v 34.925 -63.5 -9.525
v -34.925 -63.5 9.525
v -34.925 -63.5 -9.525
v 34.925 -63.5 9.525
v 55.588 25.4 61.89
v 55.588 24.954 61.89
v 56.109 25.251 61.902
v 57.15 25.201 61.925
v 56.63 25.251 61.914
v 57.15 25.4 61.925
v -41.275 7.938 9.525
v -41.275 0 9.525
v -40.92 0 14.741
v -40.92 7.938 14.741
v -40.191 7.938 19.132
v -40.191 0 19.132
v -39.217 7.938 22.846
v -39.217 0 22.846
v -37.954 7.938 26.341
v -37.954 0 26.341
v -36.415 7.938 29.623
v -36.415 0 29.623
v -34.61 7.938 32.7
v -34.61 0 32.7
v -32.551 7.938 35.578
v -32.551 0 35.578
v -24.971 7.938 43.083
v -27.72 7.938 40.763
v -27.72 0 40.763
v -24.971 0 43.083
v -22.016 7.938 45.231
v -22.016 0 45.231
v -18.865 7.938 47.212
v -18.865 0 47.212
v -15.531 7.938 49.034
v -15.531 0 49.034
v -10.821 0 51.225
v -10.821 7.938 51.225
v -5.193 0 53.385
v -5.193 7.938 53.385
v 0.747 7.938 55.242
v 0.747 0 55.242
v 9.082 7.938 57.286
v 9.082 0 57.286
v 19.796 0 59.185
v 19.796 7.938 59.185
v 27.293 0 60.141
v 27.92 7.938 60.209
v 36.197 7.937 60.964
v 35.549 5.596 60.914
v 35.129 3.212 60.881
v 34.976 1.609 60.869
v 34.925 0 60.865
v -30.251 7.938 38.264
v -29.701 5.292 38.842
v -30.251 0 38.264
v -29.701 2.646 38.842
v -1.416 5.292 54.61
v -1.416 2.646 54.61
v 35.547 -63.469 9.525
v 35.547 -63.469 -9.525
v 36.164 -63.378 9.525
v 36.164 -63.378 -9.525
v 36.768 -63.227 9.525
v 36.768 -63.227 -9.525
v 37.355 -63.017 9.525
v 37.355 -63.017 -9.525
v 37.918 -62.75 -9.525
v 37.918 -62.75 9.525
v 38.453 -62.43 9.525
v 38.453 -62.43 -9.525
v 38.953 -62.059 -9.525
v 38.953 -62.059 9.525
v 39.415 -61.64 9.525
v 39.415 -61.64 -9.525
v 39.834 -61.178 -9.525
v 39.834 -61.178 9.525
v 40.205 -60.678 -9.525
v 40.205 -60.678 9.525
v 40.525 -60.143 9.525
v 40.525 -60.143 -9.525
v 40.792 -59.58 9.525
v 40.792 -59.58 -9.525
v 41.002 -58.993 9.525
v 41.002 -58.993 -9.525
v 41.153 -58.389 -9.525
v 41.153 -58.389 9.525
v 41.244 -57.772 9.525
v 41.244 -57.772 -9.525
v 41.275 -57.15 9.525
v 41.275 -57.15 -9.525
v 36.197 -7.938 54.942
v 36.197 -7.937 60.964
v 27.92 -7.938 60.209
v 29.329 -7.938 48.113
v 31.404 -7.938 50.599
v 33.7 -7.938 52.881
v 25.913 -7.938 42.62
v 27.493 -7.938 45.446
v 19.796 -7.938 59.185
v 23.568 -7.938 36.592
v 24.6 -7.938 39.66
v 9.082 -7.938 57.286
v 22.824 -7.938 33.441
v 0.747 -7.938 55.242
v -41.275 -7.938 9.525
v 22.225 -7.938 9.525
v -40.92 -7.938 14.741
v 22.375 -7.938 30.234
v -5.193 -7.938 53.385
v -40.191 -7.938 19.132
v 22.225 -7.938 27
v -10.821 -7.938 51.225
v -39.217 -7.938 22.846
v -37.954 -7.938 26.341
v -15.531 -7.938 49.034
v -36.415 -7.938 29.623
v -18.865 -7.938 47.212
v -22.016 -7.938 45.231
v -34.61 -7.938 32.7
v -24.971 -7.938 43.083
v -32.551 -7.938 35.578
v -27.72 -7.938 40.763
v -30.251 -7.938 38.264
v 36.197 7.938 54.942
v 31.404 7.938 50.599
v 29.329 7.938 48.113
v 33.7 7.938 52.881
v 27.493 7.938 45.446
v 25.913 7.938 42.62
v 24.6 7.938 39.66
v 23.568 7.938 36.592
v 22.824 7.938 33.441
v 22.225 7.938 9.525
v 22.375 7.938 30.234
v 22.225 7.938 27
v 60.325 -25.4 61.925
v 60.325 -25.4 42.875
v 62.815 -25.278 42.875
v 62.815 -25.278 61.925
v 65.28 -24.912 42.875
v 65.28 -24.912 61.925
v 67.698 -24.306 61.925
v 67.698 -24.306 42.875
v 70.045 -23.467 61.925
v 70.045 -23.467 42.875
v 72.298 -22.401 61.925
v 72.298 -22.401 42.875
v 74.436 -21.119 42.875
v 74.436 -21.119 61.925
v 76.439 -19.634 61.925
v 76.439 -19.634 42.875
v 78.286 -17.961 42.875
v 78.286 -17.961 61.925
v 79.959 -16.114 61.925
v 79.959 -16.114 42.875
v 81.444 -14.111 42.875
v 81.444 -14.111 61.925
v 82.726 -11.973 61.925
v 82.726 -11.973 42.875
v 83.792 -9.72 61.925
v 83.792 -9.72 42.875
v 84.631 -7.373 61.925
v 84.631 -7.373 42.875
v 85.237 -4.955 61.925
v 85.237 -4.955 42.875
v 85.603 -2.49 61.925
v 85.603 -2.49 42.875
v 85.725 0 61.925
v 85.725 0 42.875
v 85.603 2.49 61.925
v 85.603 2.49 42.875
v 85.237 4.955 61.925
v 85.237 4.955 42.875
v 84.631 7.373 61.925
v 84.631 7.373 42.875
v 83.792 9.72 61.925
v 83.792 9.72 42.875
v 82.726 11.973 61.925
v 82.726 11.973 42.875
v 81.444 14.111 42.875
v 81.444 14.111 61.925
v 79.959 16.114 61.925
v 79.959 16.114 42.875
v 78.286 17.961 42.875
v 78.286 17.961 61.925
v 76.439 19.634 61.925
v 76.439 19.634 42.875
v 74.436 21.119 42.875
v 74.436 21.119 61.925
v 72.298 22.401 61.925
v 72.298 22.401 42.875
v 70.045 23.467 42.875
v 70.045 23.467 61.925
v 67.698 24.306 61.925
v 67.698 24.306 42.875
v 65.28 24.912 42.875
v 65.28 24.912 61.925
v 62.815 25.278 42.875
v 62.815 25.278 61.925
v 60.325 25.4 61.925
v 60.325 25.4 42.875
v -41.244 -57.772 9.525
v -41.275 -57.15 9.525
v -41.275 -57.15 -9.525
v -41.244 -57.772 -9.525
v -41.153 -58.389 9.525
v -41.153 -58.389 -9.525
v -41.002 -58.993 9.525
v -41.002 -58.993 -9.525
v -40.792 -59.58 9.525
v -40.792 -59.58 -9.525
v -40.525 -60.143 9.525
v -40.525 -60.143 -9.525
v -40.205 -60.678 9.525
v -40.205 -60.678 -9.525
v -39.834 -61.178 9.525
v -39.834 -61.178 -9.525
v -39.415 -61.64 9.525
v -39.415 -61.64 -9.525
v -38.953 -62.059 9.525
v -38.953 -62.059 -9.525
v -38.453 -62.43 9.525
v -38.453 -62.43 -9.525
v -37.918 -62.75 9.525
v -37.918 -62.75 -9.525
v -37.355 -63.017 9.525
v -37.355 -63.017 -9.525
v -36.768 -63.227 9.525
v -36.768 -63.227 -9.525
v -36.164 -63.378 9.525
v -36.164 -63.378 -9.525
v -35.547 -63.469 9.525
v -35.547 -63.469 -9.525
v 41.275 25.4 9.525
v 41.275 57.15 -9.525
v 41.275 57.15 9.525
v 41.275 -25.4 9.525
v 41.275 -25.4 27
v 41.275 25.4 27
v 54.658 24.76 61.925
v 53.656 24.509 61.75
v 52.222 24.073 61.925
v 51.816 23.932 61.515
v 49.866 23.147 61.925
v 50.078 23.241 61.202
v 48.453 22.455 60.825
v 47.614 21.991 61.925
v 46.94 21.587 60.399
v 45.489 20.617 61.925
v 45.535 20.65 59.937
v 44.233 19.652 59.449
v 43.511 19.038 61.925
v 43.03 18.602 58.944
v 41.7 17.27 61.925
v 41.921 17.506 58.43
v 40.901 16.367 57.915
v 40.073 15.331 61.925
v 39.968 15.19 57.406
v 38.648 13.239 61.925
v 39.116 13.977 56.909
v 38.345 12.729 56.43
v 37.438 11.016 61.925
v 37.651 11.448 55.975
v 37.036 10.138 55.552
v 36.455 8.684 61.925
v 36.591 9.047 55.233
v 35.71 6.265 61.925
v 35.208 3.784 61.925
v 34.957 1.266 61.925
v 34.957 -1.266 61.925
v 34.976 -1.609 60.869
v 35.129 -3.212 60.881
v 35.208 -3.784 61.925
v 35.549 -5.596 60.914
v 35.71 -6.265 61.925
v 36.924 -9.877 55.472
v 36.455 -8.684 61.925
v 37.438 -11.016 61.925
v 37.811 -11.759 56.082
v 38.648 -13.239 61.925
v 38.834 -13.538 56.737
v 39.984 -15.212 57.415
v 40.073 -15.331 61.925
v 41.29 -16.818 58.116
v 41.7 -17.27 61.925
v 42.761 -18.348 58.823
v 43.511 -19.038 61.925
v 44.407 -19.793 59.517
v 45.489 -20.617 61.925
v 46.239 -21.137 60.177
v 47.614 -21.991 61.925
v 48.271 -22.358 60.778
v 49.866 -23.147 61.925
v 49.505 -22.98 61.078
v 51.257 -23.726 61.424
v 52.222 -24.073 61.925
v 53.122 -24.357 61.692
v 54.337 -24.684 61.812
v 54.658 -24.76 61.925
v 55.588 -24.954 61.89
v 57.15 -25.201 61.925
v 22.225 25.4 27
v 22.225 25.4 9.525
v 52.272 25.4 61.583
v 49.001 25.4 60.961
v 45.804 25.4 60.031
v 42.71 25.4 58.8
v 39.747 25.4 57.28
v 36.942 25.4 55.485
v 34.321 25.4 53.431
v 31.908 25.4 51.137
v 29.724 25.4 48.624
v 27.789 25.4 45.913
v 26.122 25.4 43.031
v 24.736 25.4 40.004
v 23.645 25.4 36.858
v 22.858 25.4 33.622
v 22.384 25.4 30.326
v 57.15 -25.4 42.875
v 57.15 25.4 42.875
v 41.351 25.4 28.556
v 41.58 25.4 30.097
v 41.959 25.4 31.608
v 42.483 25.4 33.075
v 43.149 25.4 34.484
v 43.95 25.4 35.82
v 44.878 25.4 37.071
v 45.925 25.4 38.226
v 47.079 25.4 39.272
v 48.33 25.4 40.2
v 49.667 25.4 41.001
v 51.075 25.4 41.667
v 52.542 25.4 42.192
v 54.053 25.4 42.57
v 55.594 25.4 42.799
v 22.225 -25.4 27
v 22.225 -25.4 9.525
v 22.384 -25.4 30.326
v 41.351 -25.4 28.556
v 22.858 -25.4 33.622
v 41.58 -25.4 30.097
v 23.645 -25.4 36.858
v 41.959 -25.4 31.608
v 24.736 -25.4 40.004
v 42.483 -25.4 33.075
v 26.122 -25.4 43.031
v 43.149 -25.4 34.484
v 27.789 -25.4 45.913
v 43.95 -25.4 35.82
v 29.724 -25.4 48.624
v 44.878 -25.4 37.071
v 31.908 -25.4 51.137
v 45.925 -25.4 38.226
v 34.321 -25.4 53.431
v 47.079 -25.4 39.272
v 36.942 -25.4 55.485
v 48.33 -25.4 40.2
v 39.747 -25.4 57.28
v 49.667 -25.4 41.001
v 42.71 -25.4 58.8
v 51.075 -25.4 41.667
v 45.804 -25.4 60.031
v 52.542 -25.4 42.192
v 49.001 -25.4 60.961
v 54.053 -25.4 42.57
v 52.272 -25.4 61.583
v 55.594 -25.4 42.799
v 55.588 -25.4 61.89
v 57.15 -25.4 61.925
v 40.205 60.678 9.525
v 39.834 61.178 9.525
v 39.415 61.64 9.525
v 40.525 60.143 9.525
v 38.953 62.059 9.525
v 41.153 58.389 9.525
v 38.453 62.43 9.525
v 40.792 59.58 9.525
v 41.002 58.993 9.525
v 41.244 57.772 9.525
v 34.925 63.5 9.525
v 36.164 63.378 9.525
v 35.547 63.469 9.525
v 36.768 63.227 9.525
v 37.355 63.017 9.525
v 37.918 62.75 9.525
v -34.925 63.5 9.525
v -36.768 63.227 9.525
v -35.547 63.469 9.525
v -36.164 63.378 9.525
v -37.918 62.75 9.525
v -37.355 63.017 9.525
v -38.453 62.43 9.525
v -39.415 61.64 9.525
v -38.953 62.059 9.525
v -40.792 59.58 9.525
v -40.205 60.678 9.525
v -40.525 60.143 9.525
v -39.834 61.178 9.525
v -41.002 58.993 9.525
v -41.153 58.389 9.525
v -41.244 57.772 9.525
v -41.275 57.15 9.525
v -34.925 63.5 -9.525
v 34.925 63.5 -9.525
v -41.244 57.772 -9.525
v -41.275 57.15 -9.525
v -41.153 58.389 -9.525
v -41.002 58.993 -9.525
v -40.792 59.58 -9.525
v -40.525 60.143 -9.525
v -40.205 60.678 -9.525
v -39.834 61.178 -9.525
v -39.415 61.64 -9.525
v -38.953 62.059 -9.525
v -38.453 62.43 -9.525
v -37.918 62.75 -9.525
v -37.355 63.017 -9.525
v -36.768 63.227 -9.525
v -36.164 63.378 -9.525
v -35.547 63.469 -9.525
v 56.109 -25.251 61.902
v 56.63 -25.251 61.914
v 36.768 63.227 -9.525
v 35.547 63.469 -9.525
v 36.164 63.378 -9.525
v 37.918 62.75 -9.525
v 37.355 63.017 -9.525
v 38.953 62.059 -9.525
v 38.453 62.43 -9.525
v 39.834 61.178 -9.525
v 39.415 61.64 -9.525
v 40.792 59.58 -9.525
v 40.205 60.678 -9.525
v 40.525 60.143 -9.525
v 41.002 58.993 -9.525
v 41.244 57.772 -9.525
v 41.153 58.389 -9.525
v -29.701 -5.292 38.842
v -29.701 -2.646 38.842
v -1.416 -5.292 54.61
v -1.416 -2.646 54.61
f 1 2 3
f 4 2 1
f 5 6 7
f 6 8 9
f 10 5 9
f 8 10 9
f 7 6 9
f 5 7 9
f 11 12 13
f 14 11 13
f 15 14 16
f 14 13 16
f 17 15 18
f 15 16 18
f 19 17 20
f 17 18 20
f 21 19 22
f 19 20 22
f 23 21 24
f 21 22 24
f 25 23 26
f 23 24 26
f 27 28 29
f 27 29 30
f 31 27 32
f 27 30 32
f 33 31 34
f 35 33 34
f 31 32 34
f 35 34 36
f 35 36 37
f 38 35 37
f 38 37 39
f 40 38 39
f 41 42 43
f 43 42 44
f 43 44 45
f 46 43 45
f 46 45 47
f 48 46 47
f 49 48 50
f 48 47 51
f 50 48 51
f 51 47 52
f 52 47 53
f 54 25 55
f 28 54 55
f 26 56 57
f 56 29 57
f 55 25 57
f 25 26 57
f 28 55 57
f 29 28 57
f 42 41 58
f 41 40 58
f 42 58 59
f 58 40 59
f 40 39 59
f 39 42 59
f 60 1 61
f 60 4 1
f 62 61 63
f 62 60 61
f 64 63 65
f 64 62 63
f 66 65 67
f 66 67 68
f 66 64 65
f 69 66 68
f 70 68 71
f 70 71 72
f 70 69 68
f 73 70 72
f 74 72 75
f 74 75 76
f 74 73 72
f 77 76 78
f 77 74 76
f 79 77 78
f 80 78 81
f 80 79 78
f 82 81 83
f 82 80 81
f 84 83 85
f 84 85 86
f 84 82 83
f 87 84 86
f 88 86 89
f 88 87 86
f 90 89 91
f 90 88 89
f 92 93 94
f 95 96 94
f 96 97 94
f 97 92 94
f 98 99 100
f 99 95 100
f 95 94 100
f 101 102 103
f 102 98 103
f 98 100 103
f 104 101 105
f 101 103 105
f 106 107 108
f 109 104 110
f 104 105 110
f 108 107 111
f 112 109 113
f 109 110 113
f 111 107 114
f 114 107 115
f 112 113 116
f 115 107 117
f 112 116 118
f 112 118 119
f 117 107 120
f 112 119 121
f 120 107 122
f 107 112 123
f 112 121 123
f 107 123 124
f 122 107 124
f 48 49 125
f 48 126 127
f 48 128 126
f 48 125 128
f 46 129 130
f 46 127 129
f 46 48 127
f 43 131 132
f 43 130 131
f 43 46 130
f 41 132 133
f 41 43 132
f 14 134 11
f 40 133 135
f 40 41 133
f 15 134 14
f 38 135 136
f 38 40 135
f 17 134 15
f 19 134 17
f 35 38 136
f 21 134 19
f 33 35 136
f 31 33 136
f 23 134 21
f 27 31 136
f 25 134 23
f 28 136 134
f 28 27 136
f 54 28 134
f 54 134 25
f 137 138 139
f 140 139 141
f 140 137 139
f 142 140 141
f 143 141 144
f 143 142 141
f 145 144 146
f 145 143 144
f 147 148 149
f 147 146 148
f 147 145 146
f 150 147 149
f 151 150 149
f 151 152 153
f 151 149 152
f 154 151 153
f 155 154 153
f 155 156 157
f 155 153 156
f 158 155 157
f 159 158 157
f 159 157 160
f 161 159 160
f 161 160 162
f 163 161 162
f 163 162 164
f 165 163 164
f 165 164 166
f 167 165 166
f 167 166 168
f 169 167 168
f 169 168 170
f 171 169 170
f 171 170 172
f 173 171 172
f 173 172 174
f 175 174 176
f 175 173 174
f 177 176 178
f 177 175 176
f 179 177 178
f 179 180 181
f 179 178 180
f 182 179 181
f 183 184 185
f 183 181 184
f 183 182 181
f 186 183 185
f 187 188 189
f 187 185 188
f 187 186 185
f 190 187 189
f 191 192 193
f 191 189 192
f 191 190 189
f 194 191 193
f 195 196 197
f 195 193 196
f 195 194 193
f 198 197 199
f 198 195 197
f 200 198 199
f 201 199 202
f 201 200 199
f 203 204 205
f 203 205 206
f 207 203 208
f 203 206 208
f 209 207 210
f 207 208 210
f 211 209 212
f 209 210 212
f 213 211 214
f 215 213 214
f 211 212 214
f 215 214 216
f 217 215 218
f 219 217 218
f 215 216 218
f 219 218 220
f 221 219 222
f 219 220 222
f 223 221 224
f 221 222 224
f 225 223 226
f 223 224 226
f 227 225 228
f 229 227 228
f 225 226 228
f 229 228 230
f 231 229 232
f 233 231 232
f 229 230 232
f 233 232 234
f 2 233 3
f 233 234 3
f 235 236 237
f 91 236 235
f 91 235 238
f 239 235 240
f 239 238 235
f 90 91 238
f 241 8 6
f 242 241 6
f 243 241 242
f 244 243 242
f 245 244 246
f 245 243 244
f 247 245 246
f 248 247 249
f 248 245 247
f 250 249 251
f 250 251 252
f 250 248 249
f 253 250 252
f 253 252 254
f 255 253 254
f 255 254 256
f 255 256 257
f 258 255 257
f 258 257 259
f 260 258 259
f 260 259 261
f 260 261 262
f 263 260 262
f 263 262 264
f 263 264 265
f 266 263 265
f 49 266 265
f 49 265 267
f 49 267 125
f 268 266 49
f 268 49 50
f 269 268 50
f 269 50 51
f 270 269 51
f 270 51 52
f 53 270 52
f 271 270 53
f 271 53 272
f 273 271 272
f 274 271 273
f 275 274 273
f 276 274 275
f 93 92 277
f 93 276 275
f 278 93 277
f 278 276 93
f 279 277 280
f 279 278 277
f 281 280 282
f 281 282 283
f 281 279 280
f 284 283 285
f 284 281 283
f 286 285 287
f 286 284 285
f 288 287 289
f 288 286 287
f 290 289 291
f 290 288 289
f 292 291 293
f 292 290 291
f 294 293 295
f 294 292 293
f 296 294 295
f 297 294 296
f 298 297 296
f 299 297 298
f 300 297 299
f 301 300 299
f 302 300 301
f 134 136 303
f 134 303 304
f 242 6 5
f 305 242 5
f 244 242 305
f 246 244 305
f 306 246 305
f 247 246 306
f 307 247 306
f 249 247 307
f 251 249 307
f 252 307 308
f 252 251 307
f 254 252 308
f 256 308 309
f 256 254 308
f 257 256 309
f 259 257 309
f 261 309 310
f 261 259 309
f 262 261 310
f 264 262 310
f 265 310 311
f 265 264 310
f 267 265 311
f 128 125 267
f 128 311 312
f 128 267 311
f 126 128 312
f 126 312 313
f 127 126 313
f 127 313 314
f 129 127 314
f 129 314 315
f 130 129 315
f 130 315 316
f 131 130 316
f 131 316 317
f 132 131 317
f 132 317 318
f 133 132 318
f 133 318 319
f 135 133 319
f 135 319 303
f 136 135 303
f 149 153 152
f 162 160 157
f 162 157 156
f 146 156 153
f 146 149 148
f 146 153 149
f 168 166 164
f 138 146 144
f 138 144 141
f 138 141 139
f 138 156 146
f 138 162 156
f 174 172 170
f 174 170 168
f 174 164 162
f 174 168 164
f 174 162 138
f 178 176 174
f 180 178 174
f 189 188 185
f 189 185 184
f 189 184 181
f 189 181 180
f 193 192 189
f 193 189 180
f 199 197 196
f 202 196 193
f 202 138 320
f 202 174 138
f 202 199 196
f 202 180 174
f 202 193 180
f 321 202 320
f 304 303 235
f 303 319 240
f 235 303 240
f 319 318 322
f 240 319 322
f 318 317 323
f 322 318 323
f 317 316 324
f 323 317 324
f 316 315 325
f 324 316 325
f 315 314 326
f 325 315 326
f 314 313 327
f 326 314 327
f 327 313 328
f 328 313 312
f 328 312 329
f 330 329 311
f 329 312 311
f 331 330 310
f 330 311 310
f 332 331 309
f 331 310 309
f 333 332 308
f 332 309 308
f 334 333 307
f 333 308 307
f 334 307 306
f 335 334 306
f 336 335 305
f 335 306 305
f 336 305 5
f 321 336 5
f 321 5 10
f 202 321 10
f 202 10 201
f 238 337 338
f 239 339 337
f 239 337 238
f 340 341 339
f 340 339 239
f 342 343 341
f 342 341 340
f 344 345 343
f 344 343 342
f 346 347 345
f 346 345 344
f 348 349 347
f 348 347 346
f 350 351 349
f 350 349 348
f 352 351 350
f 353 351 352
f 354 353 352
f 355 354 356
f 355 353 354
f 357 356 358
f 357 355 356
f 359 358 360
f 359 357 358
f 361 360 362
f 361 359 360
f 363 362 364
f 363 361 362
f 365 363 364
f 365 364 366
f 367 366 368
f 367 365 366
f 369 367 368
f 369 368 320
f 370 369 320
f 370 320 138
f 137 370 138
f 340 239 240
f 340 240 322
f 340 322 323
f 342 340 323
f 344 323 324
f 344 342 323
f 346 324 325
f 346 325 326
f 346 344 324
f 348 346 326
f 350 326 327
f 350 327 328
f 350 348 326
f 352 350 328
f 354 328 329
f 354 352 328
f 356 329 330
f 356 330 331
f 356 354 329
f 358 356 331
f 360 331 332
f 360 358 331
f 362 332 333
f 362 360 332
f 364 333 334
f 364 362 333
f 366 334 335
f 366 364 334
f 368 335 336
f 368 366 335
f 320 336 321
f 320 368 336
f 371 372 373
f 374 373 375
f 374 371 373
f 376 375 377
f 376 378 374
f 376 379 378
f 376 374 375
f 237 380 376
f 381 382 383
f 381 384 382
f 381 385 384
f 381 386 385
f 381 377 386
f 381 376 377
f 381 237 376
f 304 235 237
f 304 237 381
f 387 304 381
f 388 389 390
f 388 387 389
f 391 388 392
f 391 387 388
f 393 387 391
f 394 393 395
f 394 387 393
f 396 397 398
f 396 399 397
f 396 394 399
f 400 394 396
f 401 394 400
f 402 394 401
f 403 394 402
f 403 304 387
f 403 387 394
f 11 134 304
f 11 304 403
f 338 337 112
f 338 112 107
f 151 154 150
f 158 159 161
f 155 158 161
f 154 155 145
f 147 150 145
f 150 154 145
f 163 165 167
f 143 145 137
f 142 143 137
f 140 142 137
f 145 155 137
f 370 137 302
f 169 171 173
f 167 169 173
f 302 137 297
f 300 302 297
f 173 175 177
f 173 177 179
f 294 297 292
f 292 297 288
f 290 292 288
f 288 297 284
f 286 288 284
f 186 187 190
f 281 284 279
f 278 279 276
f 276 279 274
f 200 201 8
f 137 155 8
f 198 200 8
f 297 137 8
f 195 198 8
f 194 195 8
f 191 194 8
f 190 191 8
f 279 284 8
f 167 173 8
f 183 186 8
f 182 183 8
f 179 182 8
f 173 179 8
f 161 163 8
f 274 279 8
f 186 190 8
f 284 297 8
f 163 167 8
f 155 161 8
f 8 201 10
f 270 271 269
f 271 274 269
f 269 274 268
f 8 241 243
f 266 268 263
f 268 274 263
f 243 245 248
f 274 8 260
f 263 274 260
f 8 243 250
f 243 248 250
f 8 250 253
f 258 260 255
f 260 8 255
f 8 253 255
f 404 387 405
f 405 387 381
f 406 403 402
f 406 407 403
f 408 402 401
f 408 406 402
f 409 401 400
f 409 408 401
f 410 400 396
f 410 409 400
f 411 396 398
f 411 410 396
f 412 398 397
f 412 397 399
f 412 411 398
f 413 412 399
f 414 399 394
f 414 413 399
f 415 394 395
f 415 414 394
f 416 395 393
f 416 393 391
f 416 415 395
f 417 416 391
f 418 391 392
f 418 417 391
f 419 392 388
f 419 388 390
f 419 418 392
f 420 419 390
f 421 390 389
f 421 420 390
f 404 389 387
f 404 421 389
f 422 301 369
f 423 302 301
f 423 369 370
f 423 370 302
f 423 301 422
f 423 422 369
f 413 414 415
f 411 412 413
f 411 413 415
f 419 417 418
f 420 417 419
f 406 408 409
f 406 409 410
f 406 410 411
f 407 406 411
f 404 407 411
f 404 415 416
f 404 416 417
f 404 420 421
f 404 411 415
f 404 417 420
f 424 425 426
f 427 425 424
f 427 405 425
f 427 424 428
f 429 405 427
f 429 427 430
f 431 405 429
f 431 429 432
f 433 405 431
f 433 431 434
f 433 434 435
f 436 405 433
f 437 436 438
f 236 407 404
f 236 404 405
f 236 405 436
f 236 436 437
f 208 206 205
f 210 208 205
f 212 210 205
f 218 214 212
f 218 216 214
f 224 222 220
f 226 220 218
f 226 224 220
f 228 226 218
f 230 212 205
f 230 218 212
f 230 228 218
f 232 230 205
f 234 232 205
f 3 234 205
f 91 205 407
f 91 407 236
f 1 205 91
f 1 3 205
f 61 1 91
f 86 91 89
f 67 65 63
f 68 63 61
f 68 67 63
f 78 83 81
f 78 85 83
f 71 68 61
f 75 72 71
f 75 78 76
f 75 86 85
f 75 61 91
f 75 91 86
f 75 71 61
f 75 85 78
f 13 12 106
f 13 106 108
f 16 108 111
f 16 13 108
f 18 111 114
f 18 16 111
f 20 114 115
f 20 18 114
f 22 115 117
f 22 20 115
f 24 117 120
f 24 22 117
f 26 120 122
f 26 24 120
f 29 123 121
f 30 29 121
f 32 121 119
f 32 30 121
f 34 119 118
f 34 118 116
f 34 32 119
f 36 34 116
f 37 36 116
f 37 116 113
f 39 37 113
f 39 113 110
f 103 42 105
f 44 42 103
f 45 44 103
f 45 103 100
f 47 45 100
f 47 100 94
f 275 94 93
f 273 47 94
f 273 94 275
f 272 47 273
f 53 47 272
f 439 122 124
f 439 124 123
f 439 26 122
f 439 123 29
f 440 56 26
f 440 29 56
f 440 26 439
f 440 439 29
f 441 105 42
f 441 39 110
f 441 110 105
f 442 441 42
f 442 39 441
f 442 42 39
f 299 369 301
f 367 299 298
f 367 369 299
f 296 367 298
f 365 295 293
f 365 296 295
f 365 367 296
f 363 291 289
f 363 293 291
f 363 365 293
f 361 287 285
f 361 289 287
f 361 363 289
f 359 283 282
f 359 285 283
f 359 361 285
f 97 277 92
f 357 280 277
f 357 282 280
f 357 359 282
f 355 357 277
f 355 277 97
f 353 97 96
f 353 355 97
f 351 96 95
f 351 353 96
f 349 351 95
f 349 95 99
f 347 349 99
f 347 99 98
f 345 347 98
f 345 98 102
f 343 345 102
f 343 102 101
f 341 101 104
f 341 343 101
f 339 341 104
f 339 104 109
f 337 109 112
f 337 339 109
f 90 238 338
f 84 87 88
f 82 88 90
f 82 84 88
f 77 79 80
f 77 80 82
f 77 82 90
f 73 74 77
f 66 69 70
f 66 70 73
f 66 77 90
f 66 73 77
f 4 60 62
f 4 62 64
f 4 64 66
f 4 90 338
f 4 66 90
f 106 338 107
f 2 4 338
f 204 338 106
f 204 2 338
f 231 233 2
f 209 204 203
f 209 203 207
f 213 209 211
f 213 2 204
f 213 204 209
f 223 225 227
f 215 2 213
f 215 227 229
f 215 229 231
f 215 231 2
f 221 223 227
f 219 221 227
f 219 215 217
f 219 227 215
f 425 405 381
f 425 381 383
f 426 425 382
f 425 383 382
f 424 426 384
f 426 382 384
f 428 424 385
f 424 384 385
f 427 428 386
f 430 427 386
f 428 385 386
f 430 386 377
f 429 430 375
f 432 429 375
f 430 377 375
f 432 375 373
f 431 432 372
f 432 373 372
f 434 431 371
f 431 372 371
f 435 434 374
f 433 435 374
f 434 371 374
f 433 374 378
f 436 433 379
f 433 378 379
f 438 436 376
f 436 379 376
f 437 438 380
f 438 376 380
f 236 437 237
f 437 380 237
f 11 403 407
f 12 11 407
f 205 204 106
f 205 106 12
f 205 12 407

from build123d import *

# Parameters (mm, degrees)
F1_DEPTH = 63.5
F2_DEPTH = 25.4
F3_DEPTH = 7.9375
F0_W     = 25.4
F0_H     = 19.05
F5_R     = 6.35


with BuildPart() as f1:
    # F0 (on Front) → F1 (new body, symmetric)
    with BuildSketch(Plane.XZ):
        Polygon((-41.275, 9.525), (-41.275, -9.525), (41.275, -9.525), (41.275, 9.525), (22.225, 9.525), align=None)
    extrude(amount=F1_DEPTH, both=True)

    # F0 (on Front) → F2 (join, symmetric)
    with BuildSketch(Plane.XZ):
        with BuildLine():
            Line((22.225, 9.525), (41.275, 9.525))
            Line((41.275, 9.525), (41.275, 27.0002))
            ThreePointArc((41.275, 27.0002), (45.9246798487, 38.2255201513), (57.15, 42.8752))
            Line((57.15, 42.8752), (60.325, 42.8752))
            Line((60.325, 42.8752), (60.325, 61.9252))
            Line((60.325, 61.9252), (57.15, 61.9252))
            add(Edge.make_bspline(
                [(55.5876742253, 61.8902381653), (56.1088932131, 61.9027160725), (56.6296931804, 61.9143561764), (57.15, 61.9252)],
                knots=[110.264215812, 110.264215812, 110.264215812, 110.264215812, 111.5045361635, 111.5045361635, 111.5045361635, 111.5045361635], degree=3))
            ThreePointArc((55.5876742253, 61.8902381653), (31.9079730144, 51.137219258), (22.225, 27.0002))
            Line((22.225, 27.0002), (22.225, 9.525))
        make_face()
    extrude(amount=F2_DEPTH, both=True)

    # F0 (on Front) → F3 (join, symmetric)
    with BuildSketch(Plane.XZ):
        with BuildLine():
            add(Edge.make_bspline(
                [(-41.275, 9.525), (-40.3964327978, 53.0503686598), (9.2514169059, 60.7809548666), (55.5876742253, 61.8902381653)],
                knots=[0, 0, 0, 0, 110.264215812, 110.264215812, 110.264215812, 110.264215812], degree=3))
            Line((-41.275, 9.525), (22.225, 9.525))
            Line((22.225, 9.525), (22.225, 27.0002))
            ThreePointArc((22.225, 27.0002), (31.9079730144, 51.137219258), (55.5876742253, 61.8902381653))
        make_face()
    extrude(amount=F3_DEPTH, both=True)

    # F0 (on Front) → F4 (revolve)
    with BuildSketch(Plane.XZ):
        with Locations((73.025, 52.4002)):
            Rectangle(F0_W, F0_H)
    revolve(axis=Axis((60.325, 0, 52.3875), (0, 0, 1)))

    # F5
    f5_edges = [f1.edges().sort_by_distance(p)[0] for p in [
        (-41.275, -63.5, 0),
        (41.275, -63.5, 0),
        (41.275, 63.5, 0),
        (-41.275, 63.5, 0),
    ]]
    fillet(f5_edges, radius=F5_R)


solid = f1.part
